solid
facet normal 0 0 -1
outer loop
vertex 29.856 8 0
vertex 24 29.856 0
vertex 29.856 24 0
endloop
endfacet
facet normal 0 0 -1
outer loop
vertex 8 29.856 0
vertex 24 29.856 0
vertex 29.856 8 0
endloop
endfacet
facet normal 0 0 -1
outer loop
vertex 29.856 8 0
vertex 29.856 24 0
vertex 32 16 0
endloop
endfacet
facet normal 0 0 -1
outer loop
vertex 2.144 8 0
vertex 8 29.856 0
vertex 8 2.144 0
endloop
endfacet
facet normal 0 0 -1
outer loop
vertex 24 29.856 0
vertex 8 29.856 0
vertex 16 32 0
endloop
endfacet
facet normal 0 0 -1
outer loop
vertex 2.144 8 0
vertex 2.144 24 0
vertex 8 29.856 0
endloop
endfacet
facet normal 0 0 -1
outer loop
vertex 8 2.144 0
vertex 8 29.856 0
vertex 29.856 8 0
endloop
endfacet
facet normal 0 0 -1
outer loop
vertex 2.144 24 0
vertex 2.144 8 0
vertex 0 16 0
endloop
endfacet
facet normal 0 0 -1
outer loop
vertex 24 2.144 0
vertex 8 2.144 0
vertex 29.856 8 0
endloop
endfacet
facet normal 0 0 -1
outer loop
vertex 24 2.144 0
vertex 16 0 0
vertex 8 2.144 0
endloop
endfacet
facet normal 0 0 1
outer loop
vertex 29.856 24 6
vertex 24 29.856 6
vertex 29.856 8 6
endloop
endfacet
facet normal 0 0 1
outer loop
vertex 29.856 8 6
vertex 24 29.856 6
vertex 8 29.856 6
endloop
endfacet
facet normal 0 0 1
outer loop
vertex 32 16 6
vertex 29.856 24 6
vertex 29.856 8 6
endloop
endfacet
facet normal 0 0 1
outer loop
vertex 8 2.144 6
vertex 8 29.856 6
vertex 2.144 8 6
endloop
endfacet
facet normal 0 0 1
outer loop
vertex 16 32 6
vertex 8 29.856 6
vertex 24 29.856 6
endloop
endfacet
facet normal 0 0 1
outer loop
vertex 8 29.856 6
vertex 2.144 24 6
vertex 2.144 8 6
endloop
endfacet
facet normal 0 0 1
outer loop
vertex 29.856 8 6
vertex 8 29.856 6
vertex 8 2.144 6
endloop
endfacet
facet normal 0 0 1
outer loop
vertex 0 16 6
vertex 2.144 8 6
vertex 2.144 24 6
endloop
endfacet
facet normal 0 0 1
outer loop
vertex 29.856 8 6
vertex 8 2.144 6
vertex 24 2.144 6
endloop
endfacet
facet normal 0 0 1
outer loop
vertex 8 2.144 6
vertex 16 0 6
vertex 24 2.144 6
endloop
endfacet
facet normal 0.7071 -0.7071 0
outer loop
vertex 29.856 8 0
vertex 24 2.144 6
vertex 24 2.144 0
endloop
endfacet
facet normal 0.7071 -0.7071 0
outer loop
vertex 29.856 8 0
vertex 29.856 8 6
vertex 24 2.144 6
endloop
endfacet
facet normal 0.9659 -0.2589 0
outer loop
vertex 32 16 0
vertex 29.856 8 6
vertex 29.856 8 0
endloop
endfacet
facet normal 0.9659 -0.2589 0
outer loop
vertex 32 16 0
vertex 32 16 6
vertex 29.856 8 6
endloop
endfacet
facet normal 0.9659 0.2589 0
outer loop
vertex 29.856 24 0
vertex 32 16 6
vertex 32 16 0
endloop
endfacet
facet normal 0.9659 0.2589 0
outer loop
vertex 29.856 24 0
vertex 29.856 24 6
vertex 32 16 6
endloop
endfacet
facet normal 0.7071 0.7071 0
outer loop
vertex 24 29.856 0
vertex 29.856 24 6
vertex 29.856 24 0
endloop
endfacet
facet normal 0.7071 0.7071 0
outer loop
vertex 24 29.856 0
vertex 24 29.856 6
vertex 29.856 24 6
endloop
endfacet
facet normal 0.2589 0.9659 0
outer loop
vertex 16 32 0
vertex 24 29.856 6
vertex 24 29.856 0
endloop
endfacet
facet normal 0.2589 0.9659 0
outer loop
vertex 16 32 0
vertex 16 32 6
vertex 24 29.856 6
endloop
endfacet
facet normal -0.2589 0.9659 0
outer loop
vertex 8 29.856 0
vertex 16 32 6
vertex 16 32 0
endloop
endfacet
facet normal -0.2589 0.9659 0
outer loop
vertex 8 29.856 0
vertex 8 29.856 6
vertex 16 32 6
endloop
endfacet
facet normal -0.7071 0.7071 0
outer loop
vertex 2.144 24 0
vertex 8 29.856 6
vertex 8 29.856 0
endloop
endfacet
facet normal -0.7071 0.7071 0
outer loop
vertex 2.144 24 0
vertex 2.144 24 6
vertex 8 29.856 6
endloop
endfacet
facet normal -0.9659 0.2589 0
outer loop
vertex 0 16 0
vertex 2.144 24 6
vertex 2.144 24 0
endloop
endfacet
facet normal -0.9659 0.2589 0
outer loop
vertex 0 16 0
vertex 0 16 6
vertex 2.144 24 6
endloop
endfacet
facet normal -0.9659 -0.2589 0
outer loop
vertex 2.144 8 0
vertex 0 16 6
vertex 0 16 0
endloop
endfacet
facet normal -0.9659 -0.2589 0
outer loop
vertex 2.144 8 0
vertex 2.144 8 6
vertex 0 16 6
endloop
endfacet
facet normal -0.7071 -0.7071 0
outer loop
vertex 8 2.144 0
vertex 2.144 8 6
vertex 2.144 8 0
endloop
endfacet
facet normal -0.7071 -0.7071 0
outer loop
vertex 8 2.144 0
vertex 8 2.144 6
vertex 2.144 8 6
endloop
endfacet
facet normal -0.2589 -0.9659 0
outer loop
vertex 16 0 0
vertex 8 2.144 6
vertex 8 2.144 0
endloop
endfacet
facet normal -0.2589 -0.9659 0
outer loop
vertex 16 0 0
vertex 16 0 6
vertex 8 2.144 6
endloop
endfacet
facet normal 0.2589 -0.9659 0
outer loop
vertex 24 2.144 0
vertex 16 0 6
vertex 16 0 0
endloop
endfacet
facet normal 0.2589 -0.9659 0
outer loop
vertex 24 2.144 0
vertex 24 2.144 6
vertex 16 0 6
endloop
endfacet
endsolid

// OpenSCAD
$fn = 32;

// ----------------------------------------------------------------------
// Eccentric disc: egg, 6 mm thick
// ----------------------------------------------------------------------

// --- parameters (mm) ---
profile_height = 6;       // extrusion height
profile_points = 12;      // points of the closed outline

profile = [[0, 16], [2.144, 8], [8, 2.144], [16, 0], [24, 2.144], [29.856, 8], [32, 16], [29.856, 24], [24, 29.856], [16, 32], [8, 29.856], [2.144, 24]];  // single closed polygon, 12 points, counter clockwise

// --- the one profile operation ---
linear_extrude(height = profile_height) polygon(points = profile);
